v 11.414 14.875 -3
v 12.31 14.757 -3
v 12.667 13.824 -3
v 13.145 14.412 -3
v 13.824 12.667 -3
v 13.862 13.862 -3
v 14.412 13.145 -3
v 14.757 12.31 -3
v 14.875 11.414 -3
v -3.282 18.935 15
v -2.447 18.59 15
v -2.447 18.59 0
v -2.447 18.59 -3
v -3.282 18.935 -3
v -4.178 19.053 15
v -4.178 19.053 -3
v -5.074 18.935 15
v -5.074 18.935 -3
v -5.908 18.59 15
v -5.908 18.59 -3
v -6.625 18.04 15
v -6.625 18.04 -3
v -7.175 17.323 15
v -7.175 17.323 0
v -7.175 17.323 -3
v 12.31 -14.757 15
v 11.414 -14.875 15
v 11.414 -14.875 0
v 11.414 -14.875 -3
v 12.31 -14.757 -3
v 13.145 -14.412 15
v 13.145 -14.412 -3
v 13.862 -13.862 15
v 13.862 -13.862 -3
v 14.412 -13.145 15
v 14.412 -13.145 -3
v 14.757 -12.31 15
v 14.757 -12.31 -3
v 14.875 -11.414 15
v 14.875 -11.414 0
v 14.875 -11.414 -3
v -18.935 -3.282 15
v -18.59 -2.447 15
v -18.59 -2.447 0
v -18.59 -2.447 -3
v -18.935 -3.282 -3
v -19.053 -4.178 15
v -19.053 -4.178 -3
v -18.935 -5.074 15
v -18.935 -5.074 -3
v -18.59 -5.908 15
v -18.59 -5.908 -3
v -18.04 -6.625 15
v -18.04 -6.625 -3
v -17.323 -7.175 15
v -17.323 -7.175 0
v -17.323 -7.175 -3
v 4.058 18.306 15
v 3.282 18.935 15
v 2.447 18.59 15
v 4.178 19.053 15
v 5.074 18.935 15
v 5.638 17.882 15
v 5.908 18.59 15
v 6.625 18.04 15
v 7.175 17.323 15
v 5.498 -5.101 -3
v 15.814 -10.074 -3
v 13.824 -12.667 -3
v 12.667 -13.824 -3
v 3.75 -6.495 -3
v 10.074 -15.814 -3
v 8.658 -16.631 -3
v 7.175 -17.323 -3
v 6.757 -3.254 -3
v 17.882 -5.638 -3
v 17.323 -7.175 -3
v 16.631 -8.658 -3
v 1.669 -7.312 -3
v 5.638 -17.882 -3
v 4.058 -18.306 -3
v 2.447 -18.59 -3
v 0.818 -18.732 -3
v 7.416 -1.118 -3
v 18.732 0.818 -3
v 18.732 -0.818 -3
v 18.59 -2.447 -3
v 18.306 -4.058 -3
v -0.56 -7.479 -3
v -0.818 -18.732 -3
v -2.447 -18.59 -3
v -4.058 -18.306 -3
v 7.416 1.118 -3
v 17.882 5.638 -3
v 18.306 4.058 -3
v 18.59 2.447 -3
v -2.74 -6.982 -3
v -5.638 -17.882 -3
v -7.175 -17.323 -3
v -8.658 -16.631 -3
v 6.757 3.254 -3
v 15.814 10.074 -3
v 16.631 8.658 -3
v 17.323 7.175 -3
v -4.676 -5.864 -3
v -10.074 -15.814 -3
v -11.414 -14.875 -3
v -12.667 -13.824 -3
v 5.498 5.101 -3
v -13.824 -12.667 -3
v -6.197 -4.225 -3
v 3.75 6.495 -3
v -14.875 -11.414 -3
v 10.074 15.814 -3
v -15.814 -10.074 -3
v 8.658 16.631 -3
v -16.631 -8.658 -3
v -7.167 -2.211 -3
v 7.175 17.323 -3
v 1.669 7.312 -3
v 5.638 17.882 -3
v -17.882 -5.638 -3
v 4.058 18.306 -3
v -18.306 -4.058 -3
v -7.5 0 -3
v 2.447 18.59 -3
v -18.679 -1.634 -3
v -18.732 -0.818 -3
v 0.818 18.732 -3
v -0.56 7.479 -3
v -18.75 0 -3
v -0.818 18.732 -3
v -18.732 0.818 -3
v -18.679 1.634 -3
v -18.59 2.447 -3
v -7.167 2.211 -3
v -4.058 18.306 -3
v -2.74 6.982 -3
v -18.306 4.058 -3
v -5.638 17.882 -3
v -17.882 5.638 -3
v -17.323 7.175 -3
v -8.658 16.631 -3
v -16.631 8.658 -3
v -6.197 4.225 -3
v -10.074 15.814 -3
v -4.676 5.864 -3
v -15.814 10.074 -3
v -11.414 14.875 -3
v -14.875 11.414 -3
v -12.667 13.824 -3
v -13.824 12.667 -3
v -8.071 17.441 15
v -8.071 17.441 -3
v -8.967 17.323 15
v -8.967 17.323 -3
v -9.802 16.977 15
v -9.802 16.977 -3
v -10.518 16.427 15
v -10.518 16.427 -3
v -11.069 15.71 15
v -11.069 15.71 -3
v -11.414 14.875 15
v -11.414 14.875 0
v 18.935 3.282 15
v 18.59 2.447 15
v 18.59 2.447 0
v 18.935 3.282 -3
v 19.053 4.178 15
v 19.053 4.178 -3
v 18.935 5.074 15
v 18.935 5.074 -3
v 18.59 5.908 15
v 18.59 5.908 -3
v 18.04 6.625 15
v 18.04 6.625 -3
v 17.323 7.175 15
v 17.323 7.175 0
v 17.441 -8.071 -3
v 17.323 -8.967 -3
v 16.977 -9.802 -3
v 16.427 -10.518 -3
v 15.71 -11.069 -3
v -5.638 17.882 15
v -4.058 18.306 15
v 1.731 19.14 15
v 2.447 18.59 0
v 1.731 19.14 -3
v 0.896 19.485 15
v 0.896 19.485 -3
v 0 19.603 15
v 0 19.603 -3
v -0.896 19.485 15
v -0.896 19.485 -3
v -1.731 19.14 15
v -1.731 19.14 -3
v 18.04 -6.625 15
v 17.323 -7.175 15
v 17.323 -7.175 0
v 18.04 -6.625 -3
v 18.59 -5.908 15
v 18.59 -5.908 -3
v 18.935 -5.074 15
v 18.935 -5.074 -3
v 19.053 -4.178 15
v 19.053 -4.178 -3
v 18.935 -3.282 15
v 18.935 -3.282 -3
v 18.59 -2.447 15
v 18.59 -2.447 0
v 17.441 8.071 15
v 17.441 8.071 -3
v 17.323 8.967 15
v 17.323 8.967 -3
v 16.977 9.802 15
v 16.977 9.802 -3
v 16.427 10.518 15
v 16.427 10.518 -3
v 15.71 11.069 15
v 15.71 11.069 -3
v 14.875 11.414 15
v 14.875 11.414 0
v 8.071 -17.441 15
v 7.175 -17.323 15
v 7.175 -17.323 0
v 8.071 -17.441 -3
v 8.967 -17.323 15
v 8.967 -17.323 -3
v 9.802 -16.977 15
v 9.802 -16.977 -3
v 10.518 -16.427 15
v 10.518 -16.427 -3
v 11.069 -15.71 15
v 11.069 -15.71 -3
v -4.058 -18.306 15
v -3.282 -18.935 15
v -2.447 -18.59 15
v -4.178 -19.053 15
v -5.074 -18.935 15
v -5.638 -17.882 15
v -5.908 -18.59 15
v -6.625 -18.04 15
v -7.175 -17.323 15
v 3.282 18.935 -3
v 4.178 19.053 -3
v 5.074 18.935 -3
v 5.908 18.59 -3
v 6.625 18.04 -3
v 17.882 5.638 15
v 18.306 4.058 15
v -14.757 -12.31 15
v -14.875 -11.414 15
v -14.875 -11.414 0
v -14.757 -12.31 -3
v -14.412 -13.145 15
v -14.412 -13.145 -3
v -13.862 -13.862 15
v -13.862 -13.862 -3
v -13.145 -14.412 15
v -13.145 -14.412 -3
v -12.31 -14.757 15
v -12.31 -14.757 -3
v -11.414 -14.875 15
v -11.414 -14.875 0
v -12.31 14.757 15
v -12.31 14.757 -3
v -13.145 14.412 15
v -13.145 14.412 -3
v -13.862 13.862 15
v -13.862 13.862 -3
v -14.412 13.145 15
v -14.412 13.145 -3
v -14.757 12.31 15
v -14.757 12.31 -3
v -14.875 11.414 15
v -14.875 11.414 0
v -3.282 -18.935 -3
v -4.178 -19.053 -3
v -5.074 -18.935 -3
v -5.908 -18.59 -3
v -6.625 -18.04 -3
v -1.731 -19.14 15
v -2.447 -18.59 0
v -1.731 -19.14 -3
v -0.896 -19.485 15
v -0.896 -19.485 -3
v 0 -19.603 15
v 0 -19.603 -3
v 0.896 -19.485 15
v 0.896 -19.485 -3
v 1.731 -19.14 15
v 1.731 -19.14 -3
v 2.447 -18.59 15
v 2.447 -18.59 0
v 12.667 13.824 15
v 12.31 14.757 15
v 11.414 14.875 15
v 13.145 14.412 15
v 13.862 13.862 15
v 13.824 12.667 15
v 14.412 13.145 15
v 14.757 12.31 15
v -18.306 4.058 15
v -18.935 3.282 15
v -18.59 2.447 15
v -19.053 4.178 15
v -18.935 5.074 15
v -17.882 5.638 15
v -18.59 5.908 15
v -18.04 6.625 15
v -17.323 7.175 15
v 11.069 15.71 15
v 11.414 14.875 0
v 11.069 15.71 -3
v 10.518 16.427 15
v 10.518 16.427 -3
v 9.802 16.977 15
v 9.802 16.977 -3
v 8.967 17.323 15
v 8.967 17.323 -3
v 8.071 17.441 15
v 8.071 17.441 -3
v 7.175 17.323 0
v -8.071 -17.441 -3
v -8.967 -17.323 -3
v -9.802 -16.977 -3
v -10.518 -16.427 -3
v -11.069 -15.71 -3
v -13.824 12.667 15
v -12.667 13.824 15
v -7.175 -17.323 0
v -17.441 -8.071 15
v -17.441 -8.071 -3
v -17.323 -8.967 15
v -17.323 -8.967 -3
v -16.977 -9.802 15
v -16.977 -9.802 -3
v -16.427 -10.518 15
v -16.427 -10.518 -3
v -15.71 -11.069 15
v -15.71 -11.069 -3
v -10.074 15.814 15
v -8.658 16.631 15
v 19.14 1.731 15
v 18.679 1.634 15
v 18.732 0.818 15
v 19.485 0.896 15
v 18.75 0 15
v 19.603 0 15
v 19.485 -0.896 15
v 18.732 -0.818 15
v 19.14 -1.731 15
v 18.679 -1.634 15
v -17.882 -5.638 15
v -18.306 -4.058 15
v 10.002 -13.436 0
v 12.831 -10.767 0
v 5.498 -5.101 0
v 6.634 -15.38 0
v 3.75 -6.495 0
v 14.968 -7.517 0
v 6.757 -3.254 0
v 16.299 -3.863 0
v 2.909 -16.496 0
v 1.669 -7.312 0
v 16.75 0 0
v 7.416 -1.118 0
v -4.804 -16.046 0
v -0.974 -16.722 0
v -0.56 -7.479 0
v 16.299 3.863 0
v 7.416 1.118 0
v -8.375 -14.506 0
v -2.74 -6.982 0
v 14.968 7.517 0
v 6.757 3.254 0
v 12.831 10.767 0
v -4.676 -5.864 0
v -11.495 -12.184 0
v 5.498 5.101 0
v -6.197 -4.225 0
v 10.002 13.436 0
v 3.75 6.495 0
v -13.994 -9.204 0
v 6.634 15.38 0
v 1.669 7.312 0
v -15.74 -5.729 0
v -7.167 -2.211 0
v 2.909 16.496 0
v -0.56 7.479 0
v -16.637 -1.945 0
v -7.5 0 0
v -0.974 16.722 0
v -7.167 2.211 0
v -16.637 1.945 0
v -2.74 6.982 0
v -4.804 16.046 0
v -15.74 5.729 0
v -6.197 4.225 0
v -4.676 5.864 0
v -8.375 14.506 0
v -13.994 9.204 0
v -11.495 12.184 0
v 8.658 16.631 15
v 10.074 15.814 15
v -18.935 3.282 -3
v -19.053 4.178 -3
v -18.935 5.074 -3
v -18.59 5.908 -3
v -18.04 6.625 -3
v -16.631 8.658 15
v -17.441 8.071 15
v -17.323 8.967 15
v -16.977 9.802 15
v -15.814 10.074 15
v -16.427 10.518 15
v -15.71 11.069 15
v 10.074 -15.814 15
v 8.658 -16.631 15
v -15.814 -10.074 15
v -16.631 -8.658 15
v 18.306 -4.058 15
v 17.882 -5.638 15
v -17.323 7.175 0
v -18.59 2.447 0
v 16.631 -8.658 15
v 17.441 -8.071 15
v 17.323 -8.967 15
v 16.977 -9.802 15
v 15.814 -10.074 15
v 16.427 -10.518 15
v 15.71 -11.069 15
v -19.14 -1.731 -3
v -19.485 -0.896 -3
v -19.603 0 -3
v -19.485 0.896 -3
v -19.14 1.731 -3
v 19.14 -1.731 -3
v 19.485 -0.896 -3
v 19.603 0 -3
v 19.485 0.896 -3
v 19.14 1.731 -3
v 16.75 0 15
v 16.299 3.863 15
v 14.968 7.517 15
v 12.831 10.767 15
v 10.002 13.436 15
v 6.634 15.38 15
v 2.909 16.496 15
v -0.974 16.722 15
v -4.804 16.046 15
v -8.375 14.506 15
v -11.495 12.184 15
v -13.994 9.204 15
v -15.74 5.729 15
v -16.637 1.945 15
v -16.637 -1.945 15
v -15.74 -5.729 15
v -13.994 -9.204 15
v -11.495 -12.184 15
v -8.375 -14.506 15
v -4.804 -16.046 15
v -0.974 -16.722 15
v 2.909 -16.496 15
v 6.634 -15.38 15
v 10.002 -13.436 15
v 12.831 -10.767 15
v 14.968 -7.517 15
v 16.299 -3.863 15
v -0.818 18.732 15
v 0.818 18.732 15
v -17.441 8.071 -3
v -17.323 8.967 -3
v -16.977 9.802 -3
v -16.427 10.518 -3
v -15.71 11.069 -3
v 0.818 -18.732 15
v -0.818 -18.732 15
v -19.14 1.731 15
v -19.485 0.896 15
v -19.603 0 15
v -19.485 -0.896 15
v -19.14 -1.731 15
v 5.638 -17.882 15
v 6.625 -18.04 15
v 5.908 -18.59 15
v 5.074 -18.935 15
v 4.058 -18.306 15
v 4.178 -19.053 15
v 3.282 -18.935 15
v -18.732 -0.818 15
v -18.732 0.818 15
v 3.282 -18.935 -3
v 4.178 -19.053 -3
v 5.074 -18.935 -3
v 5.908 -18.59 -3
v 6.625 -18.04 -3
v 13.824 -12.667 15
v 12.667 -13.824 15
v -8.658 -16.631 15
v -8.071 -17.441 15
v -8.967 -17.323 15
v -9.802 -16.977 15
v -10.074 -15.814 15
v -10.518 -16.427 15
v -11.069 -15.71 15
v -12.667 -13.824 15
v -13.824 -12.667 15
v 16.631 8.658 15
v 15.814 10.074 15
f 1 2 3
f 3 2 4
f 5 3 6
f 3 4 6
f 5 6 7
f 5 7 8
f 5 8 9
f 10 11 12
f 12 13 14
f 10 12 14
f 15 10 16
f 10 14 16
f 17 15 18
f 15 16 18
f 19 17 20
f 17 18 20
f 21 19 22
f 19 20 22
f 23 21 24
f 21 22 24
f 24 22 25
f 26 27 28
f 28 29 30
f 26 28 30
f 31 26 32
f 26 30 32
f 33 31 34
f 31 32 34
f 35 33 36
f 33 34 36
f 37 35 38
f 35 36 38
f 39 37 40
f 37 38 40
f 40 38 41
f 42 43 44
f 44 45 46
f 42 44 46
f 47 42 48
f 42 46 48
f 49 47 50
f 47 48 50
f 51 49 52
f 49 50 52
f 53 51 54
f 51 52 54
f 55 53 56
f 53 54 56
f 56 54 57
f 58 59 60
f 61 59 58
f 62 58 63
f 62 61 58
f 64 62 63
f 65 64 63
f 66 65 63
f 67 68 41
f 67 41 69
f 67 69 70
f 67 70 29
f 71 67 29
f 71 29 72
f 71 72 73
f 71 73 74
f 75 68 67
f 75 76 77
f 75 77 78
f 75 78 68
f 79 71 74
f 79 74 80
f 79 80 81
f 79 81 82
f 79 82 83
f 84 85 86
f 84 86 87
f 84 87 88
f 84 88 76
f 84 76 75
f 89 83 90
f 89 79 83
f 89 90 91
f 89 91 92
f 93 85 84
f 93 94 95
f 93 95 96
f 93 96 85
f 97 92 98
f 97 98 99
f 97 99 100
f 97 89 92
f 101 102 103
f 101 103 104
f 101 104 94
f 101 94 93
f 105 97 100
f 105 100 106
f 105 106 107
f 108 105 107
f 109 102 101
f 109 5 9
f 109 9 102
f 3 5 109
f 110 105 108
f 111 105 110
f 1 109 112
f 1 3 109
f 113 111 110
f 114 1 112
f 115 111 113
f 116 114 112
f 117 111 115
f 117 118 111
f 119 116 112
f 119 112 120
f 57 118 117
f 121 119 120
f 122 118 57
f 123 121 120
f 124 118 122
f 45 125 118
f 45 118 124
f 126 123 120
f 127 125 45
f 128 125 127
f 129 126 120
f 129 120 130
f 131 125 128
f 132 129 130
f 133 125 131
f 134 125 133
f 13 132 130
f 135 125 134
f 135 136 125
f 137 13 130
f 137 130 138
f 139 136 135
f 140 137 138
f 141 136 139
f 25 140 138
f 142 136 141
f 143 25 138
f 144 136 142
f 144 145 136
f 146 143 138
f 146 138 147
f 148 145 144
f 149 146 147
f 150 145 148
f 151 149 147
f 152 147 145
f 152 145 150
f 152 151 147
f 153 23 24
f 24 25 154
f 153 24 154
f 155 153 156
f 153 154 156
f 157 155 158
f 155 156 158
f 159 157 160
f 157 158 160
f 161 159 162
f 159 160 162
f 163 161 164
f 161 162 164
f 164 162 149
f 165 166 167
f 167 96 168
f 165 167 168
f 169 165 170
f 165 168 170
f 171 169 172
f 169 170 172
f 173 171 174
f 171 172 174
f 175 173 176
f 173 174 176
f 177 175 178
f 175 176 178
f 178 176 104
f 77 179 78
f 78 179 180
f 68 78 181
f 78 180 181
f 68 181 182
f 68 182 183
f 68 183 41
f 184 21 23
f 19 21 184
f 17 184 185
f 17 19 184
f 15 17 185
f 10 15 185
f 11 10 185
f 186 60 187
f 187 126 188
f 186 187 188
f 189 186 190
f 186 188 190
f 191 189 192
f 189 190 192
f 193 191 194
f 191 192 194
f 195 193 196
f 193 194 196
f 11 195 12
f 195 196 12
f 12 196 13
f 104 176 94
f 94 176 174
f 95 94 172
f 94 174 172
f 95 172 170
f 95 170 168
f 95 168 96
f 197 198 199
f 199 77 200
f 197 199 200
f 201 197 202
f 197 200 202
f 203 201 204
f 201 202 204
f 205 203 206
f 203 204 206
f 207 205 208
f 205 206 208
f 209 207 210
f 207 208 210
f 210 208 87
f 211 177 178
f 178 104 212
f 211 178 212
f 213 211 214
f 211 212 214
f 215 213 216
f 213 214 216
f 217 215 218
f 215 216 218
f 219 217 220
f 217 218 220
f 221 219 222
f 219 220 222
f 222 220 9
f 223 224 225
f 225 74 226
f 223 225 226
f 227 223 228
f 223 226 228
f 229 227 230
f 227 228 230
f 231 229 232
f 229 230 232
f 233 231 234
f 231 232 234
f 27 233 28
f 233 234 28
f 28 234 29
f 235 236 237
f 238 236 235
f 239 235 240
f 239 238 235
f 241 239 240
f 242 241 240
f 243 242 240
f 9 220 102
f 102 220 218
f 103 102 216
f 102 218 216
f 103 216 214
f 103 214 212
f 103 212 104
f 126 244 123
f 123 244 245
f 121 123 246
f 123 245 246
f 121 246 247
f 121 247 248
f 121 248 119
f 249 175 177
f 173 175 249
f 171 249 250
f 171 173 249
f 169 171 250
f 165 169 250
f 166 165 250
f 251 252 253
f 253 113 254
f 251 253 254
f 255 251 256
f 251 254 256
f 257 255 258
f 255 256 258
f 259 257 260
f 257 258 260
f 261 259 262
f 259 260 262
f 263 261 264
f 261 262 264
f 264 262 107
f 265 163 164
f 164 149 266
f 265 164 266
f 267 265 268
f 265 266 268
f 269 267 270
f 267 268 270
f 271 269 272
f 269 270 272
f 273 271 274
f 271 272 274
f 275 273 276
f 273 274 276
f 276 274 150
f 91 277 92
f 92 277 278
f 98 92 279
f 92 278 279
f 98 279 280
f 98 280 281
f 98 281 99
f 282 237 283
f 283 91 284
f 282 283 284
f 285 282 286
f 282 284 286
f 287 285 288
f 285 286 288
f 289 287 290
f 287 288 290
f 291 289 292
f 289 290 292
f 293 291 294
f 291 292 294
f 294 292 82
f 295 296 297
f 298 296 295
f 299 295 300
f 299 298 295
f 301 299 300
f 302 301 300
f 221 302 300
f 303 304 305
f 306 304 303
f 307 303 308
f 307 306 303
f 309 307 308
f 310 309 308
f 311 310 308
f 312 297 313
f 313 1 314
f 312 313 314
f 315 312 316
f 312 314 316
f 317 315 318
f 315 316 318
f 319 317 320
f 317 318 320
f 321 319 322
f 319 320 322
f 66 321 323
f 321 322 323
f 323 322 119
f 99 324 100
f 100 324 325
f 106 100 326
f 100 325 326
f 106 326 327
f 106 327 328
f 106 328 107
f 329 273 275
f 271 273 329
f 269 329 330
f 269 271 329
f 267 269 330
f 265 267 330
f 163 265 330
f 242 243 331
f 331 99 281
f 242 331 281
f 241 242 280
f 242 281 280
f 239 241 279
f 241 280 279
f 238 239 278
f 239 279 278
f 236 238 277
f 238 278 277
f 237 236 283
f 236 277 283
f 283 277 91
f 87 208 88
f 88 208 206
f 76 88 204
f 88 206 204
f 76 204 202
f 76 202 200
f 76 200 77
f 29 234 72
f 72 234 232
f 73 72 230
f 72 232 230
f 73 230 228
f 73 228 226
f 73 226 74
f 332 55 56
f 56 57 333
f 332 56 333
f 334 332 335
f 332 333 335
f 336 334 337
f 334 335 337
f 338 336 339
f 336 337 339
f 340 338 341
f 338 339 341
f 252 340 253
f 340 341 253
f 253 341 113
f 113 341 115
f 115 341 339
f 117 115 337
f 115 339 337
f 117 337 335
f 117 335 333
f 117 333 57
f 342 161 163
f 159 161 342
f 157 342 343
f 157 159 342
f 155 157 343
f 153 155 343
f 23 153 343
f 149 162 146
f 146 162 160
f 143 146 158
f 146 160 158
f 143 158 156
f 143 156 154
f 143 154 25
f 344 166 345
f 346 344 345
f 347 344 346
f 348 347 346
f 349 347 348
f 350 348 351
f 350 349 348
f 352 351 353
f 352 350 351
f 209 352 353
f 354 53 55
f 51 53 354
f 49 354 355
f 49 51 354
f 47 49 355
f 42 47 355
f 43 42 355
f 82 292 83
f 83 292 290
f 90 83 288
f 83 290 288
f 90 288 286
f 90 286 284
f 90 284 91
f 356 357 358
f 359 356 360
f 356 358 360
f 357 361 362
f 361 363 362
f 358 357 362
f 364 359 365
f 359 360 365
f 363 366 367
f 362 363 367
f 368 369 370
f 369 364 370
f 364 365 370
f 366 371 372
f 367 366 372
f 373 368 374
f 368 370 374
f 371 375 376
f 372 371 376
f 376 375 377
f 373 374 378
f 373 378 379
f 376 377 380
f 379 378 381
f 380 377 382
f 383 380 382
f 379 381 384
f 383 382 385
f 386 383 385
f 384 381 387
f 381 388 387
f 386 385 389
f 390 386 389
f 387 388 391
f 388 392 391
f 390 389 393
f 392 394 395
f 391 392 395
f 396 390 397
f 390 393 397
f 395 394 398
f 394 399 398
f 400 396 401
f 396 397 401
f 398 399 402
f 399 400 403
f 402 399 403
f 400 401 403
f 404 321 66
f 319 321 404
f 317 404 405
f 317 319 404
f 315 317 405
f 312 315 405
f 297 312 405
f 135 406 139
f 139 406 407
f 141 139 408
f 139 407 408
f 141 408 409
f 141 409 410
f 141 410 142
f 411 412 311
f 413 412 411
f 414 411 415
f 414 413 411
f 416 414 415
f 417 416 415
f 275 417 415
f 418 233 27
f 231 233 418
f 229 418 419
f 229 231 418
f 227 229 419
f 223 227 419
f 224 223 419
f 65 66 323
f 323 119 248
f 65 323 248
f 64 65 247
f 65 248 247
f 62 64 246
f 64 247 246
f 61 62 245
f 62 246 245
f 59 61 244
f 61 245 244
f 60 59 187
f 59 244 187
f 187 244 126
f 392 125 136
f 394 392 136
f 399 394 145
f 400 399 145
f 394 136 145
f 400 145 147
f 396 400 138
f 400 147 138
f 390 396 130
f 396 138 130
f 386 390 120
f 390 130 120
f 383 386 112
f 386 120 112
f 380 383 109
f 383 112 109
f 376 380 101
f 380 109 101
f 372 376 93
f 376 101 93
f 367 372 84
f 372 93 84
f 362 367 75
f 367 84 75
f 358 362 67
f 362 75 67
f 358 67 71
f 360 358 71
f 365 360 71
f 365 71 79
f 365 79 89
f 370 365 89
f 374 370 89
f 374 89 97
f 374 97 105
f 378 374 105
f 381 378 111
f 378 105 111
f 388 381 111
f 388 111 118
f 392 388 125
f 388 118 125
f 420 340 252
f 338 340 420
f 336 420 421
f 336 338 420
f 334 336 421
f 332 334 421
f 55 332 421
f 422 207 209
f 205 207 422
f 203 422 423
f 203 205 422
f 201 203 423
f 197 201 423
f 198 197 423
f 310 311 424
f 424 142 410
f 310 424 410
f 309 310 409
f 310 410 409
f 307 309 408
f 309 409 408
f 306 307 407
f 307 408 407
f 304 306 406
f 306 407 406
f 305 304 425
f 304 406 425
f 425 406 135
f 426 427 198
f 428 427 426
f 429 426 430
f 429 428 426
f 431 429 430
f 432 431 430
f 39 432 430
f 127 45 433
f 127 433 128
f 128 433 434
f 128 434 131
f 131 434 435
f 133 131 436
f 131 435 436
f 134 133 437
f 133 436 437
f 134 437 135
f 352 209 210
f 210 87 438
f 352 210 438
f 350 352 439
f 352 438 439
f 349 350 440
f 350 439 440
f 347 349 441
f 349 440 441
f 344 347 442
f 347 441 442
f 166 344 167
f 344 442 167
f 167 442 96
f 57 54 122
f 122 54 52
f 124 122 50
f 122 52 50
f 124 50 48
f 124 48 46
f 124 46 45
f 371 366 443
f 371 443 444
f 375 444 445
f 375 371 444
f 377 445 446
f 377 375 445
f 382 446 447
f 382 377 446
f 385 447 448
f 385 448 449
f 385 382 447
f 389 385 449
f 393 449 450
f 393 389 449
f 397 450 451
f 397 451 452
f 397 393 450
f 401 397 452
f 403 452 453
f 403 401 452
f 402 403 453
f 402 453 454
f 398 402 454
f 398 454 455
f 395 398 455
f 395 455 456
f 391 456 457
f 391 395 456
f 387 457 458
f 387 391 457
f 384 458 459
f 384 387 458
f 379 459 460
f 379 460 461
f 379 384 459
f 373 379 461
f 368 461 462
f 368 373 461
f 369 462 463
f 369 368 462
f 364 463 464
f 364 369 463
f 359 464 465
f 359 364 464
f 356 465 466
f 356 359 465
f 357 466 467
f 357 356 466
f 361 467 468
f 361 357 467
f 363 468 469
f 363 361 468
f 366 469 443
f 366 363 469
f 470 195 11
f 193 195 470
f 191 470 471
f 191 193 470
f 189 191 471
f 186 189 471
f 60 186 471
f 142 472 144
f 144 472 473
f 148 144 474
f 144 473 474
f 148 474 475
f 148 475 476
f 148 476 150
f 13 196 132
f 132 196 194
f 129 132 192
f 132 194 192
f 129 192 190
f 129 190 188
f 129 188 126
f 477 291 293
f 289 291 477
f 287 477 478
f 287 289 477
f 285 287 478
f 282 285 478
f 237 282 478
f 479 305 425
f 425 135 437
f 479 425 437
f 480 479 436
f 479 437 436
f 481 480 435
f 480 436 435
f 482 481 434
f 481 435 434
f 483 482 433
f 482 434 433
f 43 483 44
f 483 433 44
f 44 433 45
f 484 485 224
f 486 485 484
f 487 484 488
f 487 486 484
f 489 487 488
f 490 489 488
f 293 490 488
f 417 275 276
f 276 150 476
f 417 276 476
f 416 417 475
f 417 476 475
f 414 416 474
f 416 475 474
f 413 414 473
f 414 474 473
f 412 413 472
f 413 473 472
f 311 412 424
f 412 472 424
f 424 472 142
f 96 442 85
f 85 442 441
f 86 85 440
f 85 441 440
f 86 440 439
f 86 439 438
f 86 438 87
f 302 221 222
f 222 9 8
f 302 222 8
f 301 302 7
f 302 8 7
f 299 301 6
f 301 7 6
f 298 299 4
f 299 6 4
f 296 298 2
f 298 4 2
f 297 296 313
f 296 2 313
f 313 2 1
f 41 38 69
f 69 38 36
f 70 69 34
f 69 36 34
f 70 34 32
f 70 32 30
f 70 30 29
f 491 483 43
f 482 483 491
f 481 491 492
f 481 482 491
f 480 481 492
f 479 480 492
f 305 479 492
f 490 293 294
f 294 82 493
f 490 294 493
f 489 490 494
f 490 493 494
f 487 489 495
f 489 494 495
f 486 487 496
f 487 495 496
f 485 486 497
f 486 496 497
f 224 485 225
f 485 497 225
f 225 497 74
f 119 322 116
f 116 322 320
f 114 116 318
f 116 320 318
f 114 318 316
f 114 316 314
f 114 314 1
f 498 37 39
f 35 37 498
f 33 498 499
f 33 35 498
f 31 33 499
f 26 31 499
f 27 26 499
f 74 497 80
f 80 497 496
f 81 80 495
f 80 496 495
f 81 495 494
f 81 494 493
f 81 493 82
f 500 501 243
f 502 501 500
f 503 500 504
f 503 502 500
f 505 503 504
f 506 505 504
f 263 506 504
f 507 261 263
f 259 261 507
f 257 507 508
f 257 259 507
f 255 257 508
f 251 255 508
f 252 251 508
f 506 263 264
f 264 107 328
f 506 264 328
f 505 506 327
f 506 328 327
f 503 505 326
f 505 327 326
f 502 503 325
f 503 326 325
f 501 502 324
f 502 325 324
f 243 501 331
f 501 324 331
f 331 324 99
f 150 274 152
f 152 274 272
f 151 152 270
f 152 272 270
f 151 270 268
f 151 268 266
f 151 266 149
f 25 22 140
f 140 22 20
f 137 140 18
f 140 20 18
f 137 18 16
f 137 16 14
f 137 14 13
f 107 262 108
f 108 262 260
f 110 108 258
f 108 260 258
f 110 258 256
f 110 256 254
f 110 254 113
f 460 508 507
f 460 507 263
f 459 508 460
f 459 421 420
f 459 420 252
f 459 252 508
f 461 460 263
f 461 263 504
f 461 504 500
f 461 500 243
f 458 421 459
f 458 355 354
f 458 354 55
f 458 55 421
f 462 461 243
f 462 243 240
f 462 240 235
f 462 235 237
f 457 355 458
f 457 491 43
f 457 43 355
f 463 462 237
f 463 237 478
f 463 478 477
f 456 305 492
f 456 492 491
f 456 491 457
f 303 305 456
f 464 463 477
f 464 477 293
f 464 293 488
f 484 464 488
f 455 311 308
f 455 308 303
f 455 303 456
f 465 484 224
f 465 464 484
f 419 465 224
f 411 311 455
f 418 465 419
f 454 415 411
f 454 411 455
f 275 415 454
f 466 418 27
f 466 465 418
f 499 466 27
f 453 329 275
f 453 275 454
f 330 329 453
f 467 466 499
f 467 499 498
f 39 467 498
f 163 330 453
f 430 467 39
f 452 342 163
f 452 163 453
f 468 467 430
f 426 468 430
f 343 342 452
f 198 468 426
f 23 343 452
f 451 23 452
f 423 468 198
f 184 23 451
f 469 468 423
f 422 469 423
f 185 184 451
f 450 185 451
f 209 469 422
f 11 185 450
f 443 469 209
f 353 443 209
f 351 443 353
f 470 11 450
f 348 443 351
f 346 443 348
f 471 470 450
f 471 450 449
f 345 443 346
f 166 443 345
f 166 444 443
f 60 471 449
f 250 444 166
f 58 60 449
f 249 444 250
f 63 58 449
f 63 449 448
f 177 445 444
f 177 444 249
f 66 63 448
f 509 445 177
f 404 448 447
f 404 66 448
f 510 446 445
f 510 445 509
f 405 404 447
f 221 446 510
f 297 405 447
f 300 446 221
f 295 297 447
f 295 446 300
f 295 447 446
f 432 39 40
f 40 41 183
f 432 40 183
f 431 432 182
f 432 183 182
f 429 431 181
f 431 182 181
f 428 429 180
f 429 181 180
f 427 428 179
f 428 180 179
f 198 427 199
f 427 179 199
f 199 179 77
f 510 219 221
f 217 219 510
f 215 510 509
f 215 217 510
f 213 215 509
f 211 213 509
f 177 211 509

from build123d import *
from build123d.topology import SkipClean

# Parameters (mm, degrees)
SKETCH1_R           = 18.75
SKETCH1_R_2         = 16.75
BOSS_EXTRUDE1_DEPTH = 15
BOSS_EXTRUDE2_START = 3
SKETCH3_R           = 18.75
SKETCH3_R_2         = 7.5
BOSS_EXTRUDE2_DEPTH = 3
BOSS_EXTRUDE3_DEPTH = 18
CIRPATTERN1_COUNT   = 24


with BuildPart() as part:
    # Sketch1 → Boss-Extrude1 (new body)
    with BuildSketch(Plane.XY):
        Circle(SKETCH1_R)
        Circle(SKETCH1_R_2, mode=Mode.SUBTRACT)
    extrude(amount=BOSS_EXTRUDE1_DEPTH)

    # Sketch3 → Boss-Extrude2 (add)
    with BuildSketch(Plane(origin=(0, 0, 0), x_dir=(-1, 0, 0), z_dir=(0, 0, -1)).offset(BOSS_EXTRUDE2_START)):
        Circle(SKETCH3_R)
        Circle(SKETCH3_R_2, mode=Mode.SUBTRACT)
    extrude(amount=-BOSS_EXTRUDE2_DEPTH)

    # Sketch4 → Boss-Extrude3 (add)
    with SkipClean():  # the faces are left unmerged after this step: merging them gives an invalid solid
        with BuildSketch(Plane(origin=(0, 0, -3), x_dir=(-1, 0, 0), z_dir=(0, 0, -1))):
            with BuildLine():
                ThreePointArc((-2.447366104, 18.589591151), (0, 19.603323383), (2.447366104, 18.589591151))
                ThreePointArc((2.447366104, 18.589591151), (0, 18.75), (-2.447366104, 18.589591151))
            make_face()
        boss_extrude3 = extrude(amount=-BOSS_EXTRUDE3_DEPTH)

    # CirPattern1: Boss-Extrude3 ×24 about axis
    with SkipClean():  # the faces are left unmerged after this step: merging them gives an invalid solid
        cirpattern1_axis = Axis((0, 0, 0), (0, 0, 1))
        for i in range(1, CIRPATTERN1_COUNT):
            add(boss_extrude3.rotate(cirpattern1_axis, i * 360 / CIRPATTERN1_COUNT))


solid = part.part
